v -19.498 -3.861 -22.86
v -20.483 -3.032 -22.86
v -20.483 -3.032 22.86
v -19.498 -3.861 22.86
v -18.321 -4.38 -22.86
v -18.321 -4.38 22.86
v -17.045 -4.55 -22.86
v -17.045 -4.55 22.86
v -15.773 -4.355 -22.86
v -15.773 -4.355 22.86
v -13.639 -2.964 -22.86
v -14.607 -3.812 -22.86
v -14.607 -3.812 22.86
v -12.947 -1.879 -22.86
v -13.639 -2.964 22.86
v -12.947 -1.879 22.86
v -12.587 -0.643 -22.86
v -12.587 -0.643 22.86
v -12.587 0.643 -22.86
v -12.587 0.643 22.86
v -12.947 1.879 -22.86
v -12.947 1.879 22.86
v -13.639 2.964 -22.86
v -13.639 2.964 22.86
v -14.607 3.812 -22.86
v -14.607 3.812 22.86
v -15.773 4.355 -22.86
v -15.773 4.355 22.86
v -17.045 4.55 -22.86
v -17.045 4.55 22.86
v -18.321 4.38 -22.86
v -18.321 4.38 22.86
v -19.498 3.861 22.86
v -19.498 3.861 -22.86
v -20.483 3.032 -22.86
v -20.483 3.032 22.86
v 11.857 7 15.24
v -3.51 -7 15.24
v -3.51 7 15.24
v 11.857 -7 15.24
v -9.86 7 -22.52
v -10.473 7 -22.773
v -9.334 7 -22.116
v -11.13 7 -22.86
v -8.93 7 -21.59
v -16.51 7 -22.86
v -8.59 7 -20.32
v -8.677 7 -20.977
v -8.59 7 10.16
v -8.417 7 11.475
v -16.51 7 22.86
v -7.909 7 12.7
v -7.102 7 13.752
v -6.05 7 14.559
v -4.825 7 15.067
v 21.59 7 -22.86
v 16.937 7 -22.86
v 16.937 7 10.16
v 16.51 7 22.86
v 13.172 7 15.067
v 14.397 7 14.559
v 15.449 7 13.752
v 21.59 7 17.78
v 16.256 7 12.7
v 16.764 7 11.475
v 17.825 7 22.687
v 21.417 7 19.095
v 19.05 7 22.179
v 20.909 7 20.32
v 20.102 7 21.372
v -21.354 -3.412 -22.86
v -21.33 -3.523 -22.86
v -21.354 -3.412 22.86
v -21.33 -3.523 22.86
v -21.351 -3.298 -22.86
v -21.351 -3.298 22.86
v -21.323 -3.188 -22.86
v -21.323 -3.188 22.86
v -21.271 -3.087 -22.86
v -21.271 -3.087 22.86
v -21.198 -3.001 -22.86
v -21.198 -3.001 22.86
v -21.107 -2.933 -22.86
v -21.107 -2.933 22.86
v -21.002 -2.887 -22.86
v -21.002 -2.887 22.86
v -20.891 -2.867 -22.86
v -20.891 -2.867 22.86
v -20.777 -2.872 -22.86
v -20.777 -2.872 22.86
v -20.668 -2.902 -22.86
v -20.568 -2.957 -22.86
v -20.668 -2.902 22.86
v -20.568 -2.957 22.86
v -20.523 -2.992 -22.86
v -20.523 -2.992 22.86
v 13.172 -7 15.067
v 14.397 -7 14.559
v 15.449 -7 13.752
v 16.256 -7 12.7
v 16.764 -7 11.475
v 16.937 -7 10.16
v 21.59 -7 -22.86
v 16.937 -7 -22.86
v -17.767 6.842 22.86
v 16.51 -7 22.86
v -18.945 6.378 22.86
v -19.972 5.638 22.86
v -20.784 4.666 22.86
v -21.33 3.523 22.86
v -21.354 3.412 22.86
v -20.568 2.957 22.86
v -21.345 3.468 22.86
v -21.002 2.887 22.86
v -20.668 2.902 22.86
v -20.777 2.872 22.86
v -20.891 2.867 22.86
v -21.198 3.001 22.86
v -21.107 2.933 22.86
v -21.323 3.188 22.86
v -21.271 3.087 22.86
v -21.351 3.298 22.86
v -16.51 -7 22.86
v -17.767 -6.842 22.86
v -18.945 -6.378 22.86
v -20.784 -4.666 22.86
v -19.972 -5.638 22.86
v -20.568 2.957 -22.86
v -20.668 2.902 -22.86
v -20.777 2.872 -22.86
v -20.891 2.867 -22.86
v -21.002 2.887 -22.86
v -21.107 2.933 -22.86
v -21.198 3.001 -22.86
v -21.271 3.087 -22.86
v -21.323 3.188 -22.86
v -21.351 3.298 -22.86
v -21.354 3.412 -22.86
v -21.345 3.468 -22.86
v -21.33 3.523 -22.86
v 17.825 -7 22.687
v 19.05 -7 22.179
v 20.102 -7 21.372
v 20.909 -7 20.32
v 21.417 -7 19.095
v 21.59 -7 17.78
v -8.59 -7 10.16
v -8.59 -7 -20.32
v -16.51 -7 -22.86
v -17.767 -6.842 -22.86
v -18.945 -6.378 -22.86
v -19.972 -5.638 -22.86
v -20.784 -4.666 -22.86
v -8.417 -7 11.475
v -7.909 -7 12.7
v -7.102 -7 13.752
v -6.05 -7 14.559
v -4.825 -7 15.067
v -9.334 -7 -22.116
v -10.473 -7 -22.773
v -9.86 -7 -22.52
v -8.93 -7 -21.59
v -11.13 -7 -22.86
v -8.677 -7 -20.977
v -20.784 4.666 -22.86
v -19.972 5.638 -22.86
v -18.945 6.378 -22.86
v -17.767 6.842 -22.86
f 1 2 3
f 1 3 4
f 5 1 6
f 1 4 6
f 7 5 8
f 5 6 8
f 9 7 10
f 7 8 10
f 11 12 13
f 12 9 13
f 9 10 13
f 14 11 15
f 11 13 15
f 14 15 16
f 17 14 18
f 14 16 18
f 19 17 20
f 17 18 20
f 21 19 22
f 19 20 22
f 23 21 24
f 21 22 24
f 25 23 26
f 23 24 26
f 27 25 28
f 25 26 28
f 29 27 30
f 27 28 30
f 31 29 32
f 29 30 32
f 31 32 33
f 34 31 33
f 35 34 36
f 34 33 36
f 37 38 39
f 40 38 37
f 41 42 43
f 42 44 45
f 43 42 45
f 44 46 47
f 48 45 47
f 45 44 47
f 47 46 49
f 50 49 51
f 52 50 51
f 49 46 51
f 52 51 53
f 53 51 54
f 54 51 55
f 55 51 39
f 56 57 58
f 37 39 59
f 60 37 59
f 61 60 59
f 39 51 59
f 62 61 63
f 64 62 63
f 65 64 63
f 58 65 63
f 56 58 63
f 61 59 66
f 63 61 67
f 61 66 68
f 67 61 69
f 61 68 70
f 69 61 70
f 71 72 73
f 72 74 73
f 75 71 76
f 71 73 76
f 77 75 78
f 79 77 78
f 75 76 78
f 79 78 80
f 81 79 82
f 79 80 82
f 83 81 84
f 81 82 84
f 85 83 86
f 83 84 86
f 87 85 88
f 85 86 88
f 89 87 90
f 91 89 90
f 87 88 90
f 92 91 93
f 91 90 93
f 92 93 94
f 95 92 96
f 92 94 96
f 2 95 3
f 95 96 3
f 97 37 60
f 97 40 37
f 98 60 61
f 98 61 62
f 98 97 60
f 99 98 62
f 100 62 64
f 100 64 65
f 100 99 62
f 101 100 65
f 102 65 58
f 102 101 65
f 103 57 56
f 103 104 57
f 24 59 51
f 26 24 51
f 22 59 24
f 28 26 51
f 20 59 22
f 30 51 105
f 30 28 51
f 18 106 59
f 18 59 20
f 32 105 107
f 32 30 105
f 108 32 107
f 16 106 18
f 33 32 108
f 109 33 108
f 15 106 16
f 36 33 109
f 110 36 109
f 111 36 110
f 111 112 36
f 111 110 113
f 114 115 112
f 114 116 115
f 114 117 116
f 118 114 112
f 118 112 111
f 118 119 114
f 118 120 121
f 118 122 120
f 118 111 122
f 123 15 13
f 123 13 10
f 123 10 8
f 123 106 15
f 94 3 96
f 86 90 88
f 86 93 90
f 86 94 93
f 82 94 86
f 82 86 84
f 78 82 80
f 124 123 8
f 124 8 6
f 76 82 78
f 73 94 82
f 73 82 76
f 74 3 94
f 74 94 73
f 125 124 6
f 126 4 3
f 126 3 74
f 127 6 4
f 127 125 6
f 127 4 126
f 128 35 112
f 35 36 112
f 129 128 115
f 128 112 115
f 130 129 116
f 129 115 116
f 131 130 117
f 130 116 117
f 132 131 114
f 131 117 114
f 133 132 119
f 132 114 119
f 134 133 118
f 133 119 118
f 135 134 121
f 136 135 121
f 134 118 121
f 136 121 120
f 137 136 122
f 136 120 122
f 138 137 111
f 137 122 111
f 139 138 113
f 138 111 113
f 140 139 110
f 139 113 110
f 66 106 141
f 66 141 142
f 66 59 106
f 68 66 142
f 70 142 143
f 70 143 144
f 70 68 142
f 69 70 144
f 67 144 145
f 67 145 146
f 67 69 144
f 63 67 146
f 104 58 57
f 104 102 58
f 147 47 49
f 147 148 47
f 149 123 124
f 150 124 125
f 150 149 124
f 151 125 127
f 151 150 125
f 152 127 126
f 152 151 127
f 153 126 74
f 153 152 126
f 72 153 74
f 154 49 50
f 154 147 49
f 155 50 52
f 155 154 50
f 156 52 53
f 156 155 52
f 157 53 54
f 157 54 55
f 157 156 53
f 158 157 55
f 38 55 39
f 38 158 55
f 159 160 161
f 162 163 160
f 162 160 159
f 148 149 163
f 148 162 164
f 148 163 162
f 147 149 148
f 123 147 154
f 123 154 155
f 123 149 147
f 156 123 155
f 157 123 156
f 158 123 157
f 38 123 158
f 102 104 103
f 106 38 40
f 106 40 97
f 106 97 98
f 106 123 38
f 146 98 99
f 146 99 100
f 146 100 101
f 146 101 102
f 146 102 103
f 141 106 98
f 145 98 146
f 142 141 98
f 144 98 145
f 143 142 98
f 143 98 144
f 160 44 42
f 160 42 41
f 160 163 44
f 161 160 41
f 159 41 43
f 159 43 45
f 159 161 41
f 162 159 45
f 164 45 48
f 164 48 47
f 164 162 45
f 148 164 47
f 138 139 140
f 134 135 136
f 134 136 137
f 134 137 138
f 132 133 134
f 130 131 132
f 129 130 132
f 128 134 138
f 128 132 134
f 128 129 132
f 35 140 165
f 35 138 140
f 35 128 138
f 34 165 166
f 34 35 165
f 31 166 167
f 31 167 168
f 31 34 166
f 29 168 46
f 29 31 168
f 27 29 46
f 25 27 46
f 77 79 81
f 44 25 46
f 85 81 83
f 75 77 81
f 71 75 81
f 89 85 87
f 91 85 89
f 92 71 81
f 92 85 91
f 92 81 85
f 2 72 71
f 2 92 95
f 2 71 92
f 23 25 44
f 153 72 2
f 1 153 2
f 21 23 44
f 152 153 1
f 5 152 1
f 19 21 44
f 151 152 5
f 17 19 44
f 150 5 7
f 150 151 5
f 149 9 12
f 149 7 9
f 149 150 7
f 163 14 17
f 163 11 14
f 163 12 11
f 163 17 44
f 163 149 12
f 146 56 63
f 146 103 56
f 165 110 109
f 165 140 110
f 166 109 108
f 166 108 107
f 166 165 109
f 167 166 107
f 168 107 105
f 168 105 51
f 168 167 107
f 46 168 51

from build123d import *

# Parameters (mm, degrees)
F1_DEPTH = 7
F2_R     = 4.55
F3_DEPTH = 45.721
F4_R     = 5.08
F5_R     = 0.5
F6_R     = 5.08
F7_R     = 2.54


with BuildPart() as f1:
    # F0 (on Front) → F1 (new body, symmetric)
    with BuildSketch(Plane.XZ):
        Polygon((21.59, 22.86), (-21.59, 22.86), (-21.59, -22.86), (-8.59, -22.86), (-8.59, 15.24), (16.937, 15.24), (16.937, -22.86), (21.59, -22.86), align=None)
    extrude(amount=F1_DEPTH, both=True)

    # F2 (on face) → F3 (cut, through all)
    with BuildSketch(Plane.XY.offset(22.86)):
        with Locations((-17.0908, 0)):
            Circle(F2_R)
    extrude(amount=-F3_DEPTH, mode=Mode.SUBTRACT)

    # F4
    f4_edges = [f1.edges().sort_by_distance(p)[0] for p in [
        (-8.59, 0, 15.24),
        (16.937, 0, 15.24),
        (-21.59, -7, 0),
        (-21.59, 7, 0),
    ]]
    fillet(f4_edges, radius=F4_R)

    # F5
    f5_edges = [f1.edges().sort_by_distance(p)[0] for p in [
        (-21.59, -0.678011, 0),
        (-21.59, 0.678011, 0),
    ]]
    fillet(f5_edges, radius=F5_R)

    # F6
    f6_edges = [f1.edges().sort_by_distance(p)[0] for p in [
        (21.59, 0, 22.86),
    ]]
    fillet(f6_edges, radius=F6_R)

    # F7
    f7_edges = [f1.edges().sort_by_distance(p)[0] for p in [
        (-8.59, 0, -22.86),
    ]]
    fillet(f7_edges, radius=F7_R)


solid = f1.part
